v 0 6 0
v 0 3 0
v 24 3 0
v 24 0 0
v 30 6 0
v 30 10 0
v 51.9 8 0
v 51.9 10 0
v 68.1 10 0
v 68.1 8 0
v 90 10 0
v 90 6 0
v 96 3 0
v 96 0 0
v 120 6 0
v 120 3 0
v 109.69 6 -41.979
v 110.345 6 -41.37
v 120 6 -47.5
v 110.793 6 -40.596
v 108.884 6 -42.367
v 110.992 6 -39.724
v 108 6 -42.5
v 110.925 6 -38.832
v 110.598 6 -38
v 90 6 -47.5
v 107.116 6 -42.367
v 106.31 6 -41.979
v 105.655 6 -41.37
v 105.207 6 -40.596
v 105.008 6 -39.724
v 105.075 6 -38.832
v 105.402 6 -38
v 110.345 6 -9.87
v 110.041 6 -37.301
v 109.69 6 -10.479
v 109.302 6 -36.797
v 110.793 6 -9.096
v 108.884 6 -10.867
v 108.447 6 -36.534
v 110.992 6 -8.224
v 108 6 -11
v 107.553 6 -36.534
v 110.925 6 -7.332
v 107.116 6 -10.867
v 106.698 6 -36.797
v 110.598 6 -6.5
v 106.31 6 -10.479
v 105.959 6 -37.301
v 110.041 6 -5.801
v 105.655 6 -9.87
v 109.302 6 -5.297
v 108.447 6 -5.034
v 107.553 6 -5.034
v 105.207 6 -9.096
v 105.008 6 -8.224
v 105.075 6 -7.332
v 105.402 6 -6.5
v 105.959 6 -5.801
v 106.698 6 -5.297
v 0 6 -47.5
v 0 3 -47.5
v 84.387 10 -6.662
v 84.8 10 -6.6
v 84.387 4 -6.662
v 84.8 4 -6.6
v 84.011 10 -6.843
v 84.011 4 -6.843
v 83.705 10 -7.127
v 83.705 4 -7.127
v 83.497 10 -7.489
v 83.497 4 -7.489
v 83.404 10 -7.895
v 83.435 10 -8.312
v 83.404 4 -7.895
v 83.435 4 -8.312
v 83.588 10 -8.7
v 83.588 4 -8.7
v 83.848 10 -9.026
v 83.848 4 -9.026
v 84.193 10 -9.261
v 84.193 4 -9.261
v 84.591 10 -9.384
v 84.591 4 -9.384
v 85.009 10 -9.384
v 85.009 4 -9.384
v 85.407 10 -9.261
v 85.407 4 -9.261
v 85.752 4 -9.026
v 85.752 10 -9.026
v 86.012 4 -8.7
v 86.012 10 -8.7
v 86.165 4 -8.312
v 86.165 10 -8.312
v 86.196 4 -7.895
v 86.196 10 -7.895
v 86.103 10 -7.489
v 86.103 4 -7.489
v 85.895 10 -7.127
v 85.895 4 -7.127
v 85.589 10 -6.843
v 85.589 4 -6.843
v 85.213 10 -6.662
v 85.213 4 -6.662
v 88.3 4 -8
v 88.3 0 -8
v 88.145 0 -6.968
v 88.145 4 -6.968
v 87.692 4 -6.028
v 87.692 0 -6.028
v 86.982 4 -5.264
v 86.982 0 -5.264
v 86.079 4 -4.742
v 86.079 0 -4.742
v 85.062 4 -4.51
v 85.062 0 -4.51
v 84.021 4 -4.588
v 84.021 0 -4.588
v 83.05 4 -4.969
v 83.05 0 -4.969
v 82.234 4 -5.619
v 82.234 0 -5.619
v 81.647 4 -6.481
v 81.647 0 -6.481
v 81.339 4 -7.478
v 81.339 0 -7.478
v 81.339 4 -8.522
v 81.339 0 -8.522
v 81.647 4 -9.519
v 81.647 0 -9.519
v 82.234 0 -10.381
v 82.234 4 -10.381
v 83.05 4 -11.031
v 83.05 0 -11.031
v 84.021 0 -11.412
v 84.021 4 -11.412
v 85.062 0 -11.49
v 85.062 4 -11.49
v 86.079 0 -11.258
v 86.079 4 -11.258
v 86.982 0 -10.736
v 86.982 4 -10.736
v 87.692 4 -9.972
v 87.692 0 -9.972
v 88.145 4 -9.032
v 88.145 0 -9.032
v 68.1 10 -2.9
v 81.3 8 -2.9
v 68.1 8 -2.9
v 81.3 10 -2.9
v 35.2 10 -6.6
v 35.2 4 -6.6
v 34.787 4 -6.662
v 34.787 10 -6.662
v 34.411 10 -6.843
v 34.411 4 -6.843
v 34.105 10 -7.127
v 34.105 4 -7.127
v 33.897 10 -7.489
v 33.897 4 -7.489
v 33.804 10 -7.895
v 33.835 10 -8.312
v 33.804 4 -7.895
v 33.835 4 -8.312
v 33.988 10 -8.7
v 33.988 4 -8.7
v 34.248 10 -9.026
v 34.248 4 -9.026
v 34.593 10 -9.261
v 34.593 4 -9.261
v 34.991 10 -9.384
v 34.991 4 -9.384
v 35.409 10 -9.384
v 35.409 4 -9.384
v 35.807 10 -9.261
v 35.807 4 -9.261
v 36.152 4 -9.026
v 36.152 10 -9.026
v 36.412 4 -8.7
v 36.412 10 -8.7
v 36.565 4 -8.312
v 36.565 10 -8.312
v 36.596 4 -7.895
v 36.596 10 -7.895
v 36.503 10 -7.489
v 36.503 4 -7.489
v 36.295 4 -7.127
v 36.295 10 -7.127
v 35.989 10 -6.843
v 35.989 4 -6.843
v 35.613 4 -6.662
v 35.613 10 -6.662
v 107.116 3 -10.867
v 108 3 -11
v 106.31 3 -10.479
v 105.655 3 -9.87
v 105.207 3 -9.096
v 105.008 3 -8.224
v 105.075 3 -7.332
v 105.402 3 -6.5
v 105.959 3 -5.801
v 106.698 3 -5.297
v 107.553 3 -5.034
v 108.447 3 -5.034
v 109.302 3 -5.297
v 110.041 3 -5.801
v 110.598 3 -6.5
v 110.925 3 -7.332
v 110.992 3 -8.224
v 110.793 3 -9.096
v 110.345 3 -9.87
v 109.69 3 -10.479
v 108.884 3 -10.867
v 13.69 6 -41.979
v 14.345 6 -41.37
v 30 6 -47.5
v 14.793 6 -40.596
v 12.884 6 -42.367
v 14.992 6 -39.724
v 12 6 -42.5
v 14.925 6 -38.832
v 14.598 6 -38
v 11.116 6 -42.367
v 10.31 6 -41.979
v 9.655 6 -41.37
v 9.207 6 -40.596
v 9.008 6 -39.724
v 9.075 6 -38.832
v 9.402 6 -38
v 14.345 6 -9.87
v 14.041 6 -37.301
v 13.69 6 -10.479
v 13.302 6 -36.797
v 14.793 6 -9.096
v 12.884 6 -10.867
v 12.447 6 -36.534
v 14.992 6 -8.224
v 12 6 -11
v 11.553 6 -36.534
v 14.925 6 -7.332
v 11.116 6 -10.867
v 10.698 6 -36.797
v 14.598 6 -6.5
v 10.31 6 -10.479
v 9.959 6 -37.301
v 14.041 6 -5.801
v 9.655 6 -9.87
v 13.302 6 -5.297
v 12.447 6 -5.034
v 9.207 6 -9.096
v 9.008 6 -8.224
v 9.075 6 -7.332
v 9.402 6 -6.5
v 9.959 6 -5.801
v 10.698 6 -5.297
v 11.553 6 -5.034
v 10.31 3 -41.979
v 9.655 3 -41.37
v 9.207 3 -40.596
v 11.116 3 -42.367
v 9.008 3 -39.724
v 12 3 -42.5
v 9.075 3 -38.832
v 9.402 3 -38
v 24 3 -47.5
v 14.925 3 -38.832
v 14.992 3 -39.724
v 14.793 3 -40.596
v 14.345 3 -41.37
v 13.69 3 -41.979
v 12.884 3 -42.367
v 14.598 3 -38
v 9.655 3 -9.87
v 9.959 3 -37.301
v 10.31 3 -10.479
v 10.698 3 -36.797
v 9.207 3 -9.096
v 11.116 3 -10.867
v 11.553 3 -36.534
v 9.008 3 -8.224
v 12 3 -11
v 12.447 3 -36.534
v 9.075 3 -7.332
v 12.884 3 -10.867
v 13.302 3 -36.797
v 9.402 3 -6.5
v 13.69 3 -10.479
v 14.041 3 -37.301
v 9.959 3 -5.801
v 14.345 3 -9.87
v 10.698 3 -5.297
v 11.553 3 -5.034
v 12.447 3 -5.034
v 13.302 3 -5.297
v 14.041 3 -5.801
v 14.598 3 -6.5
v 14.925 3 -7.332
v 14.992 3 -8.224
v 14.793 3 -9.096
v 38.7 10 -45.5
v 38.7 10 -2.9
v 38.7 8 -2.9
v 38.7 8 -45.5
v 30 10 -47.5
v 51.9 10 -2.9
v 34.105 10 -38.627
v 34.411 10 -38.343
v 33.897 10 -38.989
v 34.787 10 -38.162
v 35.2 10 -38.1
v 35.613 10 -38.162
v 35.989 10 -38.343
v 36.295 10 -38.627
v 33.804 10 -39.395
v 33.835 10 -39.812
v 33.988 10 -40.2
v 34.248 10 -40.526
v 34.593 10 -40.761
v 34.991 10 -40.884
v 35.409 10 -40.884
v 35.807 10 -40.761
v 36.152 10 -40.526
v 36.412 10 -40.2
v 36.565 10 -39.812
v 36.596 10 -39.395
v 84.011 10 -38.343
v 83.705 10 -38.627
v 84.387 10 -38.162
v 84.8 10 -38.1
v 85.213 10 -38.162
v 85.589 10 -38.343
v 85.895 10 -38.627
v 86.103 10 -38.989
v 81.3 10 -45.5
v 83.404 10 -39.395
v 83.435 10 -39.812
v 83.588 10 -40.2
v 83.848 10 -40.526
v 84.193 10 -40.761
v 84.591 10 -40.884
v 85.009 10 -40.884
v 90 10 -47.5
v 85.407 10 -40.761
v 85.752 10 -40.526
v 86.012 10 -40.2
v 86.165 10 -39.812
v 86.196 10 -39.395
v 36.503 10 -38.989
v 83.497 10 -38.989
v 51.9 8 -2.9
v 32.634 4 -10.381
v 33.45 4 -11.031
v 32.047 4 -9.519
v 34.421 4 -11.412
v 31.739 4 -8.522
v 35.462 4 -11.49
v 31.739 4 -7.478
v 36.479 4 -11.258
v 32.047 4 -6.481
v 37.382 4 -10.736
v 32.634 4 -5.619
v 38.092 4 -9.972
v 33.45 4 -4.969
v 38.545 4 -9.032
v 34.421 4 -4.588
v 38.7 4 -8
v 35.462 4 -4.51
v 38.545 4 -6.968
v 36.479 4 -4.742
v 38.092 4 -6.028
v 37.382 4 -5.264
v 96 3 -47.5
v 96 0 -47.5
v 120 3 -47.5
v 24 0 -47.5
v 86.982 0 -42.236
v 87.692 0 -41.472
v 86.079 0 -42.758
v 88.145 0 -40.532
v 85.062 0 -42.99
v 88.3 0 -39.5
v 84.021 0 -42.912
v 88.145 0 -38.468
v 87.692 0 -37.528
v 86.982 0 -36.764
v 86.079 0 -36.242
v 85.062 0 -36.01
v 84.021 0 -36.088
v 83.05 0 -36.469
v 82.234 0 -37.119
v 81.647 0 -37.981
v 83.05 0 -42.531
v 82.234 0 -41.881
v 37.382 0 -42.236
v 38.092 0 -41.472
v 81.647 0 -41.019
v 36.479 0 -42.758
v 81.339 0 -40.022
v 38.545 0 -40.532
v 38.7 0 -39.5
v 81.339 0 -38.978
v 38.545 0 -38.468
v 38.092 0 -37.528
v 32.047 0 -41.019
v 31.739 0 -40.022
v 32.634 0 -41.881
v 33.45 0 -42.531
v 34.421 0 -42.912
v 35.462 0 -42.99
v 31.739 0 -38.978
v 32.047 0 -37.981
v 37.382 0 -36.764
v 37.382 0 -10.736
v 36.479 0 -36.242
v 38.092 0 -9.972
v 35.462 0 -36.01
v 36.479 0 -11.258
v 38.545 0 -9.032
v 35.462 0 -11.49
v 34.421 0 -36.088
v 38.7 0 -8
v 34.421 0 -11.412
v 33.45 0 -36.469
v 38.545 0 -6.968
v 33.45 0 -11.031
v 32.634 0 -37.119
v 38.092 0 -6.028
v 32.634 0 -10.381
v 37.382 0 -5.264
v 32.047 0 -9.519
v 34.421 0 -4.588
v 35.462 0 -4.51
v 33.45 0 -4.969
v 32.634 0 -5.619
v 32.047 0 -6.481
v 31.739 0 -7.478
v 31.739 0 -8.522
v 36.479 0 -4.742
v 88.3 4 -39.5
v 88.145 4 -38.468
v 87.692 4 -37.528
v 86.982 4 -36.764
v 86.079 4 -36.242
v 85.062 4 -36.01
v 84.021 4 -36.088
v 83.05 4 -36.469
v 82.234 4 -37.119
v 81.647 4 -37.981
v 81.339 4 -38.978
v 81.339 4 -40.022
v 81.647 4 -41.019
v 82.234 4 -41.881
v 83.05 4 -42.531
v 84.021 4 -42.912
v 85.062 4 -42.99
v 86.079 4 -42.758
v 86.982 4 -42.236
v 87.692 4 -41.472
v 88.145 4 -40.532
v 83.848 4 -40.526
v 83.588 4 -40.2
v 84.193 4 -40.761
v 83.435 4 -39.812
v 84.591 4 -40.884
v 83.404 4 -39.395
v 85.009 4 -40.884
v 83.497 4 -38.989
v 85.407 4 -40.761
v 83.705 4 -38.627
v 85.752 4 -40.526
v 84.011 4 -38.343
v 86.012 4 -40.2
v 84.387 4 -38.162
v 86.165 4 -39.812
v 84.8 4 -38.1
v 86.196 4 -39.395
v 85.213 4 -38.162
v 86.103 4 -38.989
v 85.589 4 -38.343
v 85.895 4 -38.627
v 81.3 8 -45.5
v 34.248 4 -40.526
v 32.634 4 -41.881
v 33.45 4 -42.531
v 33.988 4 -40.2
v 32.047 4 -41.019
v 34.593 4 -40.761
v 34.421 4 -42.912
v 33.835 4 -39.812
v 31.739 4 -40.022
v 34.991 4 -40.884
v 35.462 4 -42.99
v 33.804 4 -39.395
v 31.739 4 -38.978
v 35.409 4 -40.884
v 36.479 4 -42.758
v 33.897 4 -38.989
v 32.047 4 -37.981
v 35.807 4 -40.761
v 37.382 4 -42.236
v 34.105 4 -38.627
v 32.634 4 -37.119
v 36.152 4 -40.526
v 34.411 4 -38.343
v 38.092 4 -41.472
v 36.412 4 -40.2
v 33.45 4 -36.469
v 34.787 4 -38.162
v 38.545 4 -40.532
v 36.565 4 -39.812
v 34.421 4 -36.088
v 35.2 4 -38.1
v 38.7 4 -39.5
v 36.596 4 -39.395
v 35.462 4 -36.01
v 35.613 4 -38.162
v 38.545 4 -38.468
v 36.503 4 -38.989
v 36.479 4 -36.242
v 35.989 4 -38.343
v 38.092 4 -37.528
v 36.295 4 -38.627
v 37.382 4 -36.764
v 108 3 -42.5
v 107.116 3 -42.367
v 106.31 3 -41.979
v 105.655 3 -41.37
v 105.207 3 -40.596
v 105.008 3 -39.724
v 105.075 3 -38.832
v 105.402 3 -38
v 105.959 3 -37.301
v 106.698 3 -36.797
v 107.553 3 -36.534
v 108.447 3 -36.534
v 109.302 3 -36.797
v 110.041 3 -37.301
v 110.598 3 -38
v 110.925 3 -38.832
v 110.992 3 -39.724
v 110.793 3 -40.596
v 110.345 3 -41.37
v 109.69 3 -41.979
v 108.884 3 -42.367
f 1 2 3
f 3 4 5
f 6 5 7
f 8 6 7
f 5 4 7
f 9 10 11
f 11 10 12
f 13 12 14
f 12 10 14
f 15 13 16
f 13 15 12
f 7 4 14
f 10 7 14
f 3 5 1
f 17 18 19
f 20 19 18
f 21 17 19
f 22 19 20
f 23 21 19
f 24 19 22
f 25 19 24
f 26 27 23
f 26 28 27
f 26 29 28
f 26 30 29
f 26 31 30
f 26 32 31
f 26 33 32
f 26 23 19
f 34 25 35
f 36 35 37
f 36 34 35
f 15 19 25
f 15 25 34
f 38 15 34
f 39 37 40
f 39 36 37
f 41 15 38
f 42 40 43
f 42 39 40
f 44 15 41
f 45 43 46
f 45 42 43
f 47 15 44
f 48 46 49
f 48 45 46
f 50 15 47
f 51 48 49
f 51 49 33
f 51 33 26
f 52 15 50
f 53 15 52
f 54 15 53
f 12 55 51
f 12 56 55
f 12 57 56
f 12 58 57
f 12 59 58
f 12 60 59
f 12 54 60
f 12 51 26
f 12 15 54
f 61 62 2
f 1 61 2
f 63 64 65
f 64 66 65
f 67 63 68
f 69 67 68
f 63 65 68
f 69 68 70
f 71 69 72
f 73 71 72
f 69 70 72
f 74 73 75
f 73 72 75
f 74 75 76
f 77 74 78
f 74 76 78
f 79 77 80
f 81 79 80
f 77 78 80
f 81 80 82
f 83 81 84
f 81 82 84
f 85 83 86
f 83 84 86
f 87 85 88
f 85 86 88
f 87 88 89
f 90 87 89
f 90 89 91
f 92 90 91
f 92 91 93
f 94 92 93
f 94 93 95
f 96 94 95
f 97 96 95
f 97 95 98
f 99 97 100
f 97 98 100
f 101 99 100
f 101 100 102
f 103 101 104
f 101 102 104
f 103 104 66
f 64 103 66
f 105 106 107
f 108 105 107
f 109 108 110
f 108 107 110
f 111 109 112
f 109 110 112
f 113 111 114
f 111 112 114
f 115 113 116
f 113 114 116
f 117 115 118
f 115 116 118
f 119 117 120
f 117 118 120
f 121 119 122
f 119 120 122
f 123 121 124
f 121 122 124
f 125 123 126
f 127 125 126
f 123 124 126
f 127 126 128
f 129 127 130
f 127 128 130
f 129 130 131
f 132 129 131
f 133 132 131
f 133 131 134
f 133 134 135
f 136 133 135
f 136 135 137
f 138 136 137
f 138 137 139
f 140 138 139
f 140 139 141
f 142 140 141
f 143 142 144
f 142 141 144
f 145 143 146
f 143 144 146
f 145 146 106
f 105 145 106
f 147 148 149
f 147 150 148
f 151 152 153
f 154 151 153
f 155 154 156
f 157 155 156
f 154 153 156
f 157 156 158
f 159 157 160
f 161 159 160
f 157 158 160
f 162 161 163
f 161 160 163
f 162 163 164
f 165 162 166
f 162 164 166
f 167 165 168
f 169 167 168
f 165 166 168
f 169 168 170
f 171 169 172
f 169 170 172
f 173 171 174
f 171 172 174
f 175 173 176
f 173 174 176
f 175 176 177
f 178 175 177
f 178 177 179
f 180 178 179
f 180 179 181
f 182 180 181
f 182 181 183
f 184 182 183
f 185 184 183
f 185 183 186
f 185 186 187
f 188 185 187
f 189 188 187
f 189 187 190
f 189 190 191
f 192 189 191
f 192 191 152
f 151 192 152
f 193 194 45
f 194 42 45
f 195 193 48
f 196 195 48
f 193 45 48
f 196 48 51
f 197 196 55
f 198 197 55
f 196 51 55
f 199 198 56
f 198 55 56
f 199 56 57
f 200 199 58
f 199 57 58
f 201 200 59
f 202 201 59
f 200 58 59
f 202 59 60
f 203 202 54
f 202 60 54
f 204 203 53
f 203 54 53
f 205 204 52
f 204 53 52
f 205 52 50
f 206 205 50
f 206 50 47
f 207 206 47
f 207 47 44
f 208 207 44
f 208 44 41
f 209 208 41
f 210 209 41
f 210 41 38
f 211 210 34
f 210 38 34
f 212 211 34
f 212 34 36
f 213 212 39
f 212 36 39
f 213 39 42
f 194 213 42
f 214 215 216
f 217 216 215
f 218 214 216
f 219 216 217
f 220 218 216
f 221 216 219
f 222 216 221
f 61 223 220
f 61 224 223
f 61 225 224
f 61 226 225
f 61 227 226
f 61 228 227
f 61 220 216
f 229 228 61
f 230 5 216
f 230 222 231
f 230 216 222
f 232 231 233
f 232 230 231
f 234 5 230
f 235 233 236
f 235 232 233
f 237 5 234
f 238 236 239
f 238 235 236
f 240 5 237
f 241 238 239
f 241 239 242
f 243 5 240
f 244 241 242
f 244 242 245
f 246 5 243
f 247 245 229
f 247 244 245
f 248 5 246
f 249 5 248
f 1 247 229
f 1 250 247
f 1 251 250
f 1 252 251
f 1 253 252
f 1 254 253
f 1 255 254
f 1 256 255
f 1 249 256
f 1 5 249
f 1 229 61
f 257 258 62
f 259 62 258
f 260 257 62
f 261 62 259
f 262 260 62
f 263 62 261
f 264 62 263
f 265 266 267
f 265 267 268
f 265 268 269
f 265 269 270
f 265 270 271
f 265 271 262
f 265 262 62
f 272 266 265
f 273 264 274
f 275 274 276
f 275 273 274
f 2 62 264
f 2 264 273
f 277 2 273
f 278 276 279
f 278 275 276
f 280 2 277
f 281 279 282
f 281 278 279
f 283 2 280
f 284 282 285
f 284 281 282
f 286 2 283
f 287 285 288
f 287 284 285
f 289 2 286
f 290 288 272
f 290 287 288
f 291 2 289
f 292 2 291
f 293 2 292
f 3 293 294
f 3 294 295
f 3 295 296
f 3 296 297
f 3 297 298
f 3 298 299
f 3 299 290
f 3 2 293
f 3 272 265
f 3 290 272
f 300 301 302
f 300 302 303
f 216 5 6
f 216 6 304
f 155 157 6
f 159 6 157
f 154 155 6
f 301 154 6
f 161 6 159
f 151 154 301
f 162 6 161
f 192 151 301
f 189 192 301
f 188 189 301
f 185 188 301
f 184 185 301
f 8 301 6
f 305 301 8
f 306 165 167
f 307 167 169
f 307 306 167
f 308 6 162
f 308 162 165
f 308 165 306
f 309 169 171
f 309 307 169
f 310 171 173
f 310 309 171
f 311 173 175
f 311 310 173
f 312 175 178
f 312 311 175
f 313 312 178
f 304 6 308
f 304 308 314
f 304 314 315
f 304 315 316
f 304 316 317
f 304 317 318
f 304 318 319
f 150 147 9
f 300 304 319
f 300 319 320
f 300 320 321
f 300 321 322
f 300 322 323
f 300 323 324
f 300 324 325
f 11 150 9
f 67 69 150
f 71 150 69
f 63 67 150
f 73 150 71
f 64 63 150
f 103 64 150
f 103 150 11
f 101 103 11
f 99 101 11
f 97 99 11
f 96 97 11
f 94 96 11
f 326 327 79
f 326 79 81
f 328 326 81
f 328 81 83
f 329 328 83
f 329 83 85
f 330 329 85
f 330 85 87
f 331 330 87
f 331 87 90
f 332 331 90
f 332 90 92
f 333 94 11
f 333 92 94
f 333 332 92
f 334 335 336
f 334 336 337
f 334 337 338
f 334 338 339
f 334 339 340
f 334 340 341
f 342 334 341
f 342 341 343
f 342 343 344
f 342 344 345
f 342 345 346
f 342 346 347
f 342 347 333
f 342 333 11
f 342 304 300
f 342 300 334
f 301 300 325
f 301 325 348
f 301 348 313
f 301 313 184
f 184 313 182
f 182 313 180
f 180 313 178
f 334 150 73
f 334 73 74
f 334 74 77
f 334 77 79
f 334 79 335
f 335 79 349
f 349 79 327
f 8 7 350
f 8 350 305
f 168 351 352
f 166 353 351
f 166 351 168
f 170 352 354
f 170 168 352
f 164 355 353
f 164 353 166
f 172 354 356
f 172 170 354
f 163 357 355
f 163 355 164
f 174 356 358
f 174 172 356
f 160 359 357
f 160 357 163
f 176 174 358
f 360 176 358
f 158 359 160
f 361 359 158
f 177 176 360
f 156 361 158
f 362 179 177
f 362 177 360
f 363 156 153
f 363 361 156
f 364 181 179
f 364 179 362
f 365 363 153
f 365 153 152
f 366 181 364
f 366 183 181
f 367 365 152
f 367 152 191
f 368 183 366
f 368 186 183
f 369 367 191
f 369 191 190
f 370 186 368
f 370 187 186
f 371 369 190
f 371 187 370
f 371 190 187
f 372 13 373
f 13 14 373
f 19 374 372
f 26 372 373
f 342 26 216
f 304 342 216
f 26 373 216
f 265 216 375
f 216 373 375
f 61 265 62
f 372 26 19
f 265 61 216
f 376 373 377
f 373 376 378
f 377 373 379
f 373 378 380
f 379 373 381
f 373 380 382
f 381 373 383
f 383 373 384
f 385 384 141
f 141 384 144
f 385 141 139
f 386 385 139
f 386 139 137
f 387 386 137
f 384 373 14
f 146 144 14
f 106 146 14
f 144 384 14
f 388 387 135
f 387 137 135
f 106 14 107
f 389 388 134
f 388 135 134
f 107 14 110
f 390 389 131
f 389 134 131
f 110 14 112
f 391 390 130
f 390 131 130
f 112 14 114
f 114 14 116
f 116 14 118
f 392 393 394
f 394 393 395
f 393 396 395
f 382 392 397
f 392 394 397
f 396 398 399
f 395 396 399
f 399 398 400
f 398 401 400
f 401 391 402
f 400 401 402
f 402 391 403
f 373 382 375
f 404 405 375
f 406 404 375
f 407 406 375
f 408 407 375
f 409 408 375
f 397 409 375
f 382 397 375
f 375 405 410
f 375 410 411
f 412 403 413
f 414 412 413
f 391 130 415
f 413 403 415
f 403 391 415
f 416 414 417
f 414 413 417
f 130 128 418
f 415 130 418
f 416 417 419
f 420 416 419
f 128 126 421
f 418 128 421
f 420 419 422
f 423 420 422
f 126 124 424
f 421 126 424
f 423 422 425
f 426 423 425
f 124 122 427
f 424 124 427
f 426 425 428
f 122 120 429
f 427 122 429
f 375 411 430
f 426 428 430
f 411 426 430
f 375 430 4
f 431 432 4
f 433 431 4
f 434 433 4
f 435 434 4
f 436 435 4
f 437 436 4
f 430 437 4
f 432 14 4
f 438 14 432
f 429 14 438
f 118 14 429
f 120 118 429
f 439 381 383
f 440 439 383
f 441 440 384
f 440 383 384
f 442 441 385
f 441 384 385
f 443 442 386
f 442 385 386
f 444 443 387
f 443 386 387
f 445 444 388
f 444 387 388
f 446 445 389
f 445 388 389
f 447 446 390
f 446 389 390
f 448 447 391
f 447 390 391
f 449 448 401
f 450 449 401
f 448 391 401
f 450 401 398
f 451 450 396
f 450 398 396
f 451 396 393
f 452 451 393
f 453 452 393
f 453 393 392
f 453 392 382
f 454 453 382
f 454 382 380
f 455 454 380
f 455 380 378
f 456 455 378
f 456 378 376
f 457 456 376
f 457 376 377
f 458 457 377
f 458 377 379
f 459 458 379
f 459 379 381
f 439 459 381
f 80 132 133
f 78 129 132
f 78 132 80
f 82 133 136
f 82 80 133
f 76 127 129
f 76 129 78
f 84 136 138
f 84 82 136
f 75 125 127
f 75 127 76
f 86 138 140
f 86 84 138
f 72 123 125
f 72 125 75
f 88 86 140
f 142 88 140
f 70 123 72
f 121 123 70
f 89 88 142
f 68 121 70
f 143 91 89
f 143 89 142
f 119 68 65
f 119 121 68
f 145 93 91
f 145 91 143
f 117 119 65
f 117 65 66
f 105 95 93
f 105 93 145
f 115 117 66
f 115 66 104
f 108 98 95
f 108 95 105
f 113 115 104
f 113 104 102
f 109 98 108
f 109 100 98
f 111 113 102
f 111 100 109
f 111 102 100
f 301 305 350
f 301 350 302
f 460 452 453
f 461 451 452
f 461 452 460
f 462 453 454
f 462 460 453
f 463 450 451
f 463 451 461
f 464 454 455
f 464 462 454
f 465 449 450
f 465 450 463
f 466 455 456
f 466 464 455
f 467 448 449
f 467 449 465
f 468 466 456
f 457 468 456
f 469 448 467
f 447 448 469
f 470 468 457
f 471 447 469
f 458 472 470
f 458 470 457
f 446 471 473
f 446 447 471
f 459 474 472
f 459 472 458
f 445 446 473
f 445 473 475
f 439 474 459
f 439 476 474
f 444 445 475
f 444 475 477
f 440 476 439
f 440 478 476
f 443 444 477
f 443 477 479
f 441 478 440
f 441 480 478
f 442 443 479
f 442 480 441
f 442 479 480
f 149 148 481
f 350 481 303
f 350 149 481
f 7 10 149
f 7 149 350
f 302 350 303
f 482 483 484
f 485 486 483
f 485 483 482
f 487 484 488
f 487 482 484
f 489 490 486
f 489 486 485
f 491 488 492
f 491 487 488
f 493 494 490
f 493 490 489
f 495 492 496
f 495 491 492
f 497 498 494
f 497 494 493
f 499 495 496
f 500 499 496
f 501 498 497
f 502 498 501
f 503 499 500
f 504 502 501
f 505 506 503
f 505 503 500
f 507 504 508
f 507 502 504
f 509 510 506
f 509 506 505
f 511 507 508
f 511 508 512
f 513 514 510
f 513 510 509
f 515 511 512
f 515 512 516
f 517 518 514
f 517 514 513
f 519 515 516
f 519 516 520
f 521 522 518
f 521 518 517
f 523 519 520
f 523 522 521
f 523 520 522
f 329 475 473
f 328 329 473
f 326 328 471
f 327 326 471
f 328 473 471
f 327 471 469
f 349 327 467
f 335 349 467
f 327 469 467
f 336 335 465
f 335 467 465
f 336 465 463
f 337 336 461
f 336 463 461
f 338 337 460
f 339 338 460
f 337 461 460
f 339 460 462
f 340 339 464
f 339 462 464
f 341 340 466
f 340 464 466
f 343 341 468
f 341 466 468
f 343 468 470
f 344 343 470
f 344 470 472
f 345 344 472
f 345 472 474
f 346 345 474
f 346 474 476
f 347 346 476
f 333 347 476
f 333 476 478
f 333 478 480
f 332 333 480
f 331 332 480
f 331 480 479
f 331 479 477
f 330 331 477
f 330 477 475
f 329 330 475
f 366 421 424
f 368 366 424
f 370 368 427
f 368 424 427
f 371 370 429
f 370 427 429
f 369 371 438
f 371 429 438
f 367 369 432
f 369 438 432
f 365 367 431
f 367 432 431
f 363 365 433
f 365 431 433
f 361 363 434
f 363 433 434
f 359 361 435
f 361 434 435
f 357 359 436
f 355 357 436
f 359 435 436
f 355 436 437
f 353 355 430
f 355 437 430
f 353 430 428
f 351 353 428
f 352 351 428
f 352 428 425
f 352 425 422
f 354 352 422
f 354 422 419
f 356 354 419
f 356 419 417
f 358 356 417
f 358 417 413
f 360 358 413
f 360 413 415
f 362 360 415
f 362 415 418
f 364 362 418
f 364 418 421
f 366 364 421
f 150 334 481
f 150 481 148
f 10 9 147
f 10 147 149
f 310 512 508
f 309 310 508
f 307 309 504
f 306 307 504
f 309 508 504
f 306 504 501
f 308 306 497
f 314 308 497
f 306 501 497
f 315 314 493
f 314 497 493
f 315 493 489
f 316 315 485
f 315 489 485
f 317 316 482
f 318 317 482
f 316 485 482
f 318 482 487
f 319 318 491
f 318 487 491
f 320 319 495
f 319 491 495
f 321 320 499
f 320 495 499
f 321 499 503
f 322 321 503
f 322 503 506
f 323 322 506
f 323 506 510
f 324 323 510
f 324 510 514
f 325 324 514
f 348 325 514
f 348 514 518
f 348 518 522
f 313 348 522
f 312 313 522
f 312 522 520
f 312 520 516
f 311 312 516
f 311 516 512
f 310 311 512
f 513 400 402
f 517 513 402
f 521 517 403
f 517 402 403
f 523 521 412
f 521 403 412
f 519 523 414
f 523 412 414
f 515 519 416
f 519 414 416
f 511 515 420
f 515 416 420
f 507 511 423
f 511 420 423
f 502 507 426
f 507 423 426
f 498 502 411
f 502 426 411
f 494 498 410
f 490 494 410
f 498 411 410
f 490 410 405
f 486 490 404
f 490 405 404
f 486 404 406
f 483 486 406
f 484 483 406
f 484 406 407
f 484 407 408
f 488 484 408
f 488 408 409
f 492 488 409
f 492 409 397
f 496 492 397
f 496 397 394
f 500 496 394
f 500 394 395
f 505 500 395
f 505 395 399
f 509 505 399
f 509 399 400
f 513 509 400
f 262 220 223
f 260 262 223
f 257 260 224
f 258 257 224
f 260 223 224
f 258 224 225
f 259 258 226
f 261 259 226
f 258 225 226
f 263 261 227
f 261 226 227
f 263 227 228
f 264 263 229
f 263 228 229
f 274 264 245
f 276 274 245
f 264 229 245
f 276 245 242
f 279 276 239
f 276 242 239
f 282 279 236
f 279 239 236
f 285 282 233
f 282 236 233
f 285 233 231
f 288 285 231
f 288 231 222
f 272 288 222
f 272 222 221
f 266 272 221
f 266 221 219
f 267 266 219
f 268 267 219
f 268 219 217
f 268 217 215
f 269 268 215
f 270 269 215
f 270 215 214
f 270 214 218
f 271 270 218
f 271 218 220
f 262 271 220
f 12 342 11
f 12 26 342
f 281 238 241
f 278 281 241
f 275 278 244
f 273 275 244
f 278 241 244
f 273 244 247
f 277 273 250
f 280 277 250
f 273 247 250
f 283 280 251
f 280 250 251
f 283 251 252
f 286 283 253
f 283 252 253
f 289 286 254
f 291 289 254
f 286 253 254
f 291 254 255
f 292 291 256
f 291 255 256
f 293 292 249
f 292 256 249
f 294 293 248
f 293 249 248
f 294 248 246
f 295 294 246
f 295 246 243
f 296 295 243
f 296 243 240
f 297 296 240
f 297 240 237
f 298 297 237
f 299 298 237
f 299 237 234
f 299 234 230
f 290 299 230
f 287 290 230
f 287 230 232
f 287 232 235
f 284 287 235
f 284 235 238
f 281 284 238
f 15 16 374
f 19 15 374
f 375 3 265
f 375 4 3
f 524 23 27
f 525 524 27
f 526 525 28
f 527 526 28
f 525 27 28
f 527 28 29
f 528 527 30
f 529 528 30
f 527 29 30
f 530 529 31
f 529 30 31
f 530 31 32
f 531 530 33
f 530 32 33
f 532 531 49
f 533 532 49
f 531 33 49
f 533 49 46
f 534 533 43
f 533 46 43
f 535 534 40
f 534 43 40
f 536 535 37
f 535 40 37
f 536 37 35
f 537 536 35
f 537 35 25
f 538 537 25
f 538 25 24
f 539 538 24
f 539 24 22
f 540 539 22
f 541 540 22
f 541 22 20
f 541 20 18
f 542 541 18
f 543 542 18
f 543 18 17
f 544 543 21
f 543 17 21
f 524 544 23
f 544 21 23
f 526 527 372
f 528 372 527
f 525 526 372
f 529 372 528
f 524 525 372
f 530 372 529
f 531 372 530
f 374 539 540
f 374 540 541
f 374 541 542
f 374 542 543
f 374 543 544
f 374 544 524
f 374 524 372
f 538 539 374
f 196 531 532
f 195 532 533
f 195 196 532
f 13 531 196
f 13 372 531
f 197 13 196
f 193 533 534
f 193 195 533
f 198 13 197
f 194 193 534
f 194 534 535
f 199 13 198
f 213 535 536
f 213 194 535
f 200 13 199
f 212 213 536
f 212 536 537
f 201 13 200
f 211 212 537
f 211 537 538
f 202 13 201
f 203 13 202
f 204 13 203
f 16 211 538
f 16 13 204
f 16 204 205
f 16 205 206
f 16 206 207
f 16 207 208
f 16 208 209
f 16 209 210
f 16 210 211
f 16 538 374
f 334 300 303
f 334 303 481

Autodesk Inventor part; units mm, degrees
ref_plane "YZ Plane" through (0, 0, 0) normal (1, 0, 0) x (0, 1, 0)
ref_plane "XZ Plane" through (0, 0, 0) normal (0, 1, 0) x (-1, 0, 0)
ref_plane "XY Plane" through (0, 0, 0) normal (0, 0, 1) x (1, 0, 0)
sketch "スケッチ1" plane through (0, 0, 0) normal (0, 1, 0) x (-1, 0, 0)
  line L0 (0, 0) -> (-120, 0)
  line L1 (-120, 0) -> (-120, -47.5)
  line L2 (-120, -47.5) -> (0, -47.5)
  line L3 (0, -47.5) -> (0, 0)
  dimension "d0" = 120
  dimension "d1" = 47.5
extrude "押し出し1" add sketch "スケッチ1" along normal blind 6
ref_plane "作業平面1" through (0, 0, 0) normal (0, 0, 1) x (1, 0, 0)
ref_plane "作業平面2" through (0, 6, 0) normal (0, 1, 0) x (1, 0, 0)
sketch "スケッチ3" plane through (0, 6, 0) normal (0, 1, 0) x (1, 0, 0)
  line L0 (120, 47.5) -> (0, 47.5) projected
  line L1 (0, 0) -> (120, 0) projected
  line L2 (30, 47.5) -> (90, 47.5)
  line L3 (90, 47.5) -> (90, 0)
  line L4 (90, 0) -> (30, 0)
  line L5 (30, 0) -> (30, 47.5)
  point P0 (30, 0)
  point P1 (60, 47.5)
  point P2 (60, 47.5)
  point P3 (60, 47.5)
  dimension "d9" = 60
  dimension "d50" = 0
extrude "押し出し3" add sketch "スケッチ3" along normal blind 4
ref_plane "作業平面3" through (0, 10, 0) normal (0, 1, 0) x (1, 0, 0)
sketch "スケッチ4" plane through (0, 10, 0) normal (0, 1, 0) x (1, 0, 0)
  line L0 (38.7, 45.5) -> (81.3, 45.5)
  line L1 (81.3, 45.5) -> (81.3, 2.9)
  line L2 (81.3, 2.9) -> (38.7, 2.9)
  line L3 (38.7, 2.9) -> (38.7, 45.5)
  line L4 (90, 47.5) -> (30, 47.5) projected
  line L5 (90, 0) -> (90, 47.5) projected
  point P0 (0, 0)
  point P1 (90, 23.75)
  point P2 (60, 47.5)
  dimension "d14" = 42.6
  dimension "d15" = 42.6
extrude "押し出し4" cut sketch "スケッチ4" against normal blind 2
sketch "スケッチ5" plane through (120, 0, 0) normal (0, 0, 1) x (1, 0, 0)
  line L0 (-30, 10) -> (-90, 10) projected
  line L1 (-38.7, 8) -> (-81.3, 8) projected
  line L2 (-68.1, 10) -> (-51.9, 10)
  line L3 (-51.9, 10) -> (-51.9, 8)
  line L4 (-51.9, 8) -> (-68.1, 8)
  line L5 (-68.1, 8) -> (-68.1, 10)
  point P0 (-120, 0)
  dimension "d20" = 16.2
extrude "押し出し5" cut sketch "スケッチ5" against normal blind 3
sketch "スケッチ6" plane through (0, 10, 0) normal (0, 1, 0) x (1, 0, 0)
  line L0 (90, 47.5) -> (30, 47.5) projected
  line L1 (144, 0) -> (-24, 0) projected
  line L2 (30, 47.5) -> (30, 0) projected
  line L3 (90, 0) -> (90, 47.5) projected
  line L4 (38.7, 2.9) -> (38.7, 45.5) projected
  point P0 (0, 0)
  point P1 (35.2, 39.5)
  point P2 (35.2, 8)
  point P3 (84.8, 8)
  point P4 (84.8, 39.5)
  dimension "d27" = 8
  dimension "d28" = 8
  dimension "d29" = 8
  dimension "d30" = 8
  dimension "d31" = 5.2
  dimension "d32" = 5.2
  dimension "d33" = 5.2
  dimension "d34" = 5.2
  dimension "d49" = 49.6
  dimension "d75" = 3.5
hole "穴1" at (35.2, 10, -39.5) at (35.2, 10, -8) at (84.8, 10, -8) at (84.8, 10, -39.5) direction (0, -1, 0) diameter 2.8 end through all
sketch "スケッチ7" plane through (0, 0, 0) normal (0, -1, 0) x (1, 0, 0)
  circle A0 centre (35.2, -8) radius 1.4 projected
  circle A1 centre (35.2, -8) radius 3.5
  circle A2 centre (84.8, -8) radius 1.4 projected
  circle A3 centre (84.8, -8) radius 3.5
  circle A4 centre (84.8, -39.5) radius 1.4 projected
  circle A5 centre (84.8, -39.5) radius 3.5
  circle A6 centre (35.2, -39.5) radius 1.4 projected
  circle A7 centre (35.2, -39.5) radius 3.5
  point P0 (0, 0)
  dimension "d42" = 7
  dimension "d43" = 7
  dimension "d44" = 7
  dimension "d45" = 7
extrude "押し出し6" cut sketch "スケッチ7" against normal blind 4 contours A0 | A1 | A3 | A4 | A5 | A6 | A7
ref_plane "作業平面4" through (0, 0, 0) normal (0, -1, 0) x (1, 0, 0)
sketch "スケッチ8" plane through (0, 0, 0) normal (0, -1, 0) x (1, 0, 0)
  line L0 (0, 0) -> (24, 0)
  line L1 (24, 0) -> (24, -47.5)
  line L2 (24, -47.5) -> (0, -47.5)
  line L3 (0, -47.5) -> (0, 0)
  line L4 (120, 0) -> (120, -47.5) projected
  line L5 (120, 0) -> (96, 0)
  line L6 (96, 0) -> (96, -47.5)
  line L7 (96, -47.5) -> (120, -47.5)
  line L8 (120, -47.5) -> (120, 0)
  dimension "d53" = 24
  dimension "d54" = 47.5
  dimension "d55" = 24
  dimension "d56" = 47.5
extrude "押し出し7" cut sketch "スケッチ8" against normal blind 3
ref_plane "作業平面5" through (0, 3, 0) normal (0, -1, 0) x (1, 0, 0)
sketch "スケッチ9" plane through (0, 3, 0) normal (0, -1, 0) x (1, 0, 0)
  line L0 (0, -47.5) -> (0, 0) projected
  line L1 (0, 0) -> (24, 0) projected
  line L2 (24, -47.5) -> (0, -47.5) projected
  line L3 (120, 0) -> (120, -47.5) projected
  line L4 (96, 0) -> (120, 0) projected
  line L5 (120, -47.5) -> (96, -47.5) projected
  line L6 (24, 0) -> (24, -47.5) projected
  point P0 (12, -8)
  point P1 (12, -39.5)
  point P2 (108, -8)
  point P3 (108, -39.5)
  point P4 (12, 0)
  dimension "d60" = 12
  dimension "d61" = 8
  dimension "d62" = 8
  dimension "d63" = 12
  dimension "d64" = 12
  dimension "d65" = 12
  dimension "d66" = 8
  dimension "d67" = 8
  dimension "d76" = 12
hole "穴2" at (12, 3, -8) at (12, 3, -39.5) at (108, 3, -8) at (108, 3, -39.5) direction (0, 1, 0) diameter 6 end through all
properties part number "motor_mount1_3D プリント"
